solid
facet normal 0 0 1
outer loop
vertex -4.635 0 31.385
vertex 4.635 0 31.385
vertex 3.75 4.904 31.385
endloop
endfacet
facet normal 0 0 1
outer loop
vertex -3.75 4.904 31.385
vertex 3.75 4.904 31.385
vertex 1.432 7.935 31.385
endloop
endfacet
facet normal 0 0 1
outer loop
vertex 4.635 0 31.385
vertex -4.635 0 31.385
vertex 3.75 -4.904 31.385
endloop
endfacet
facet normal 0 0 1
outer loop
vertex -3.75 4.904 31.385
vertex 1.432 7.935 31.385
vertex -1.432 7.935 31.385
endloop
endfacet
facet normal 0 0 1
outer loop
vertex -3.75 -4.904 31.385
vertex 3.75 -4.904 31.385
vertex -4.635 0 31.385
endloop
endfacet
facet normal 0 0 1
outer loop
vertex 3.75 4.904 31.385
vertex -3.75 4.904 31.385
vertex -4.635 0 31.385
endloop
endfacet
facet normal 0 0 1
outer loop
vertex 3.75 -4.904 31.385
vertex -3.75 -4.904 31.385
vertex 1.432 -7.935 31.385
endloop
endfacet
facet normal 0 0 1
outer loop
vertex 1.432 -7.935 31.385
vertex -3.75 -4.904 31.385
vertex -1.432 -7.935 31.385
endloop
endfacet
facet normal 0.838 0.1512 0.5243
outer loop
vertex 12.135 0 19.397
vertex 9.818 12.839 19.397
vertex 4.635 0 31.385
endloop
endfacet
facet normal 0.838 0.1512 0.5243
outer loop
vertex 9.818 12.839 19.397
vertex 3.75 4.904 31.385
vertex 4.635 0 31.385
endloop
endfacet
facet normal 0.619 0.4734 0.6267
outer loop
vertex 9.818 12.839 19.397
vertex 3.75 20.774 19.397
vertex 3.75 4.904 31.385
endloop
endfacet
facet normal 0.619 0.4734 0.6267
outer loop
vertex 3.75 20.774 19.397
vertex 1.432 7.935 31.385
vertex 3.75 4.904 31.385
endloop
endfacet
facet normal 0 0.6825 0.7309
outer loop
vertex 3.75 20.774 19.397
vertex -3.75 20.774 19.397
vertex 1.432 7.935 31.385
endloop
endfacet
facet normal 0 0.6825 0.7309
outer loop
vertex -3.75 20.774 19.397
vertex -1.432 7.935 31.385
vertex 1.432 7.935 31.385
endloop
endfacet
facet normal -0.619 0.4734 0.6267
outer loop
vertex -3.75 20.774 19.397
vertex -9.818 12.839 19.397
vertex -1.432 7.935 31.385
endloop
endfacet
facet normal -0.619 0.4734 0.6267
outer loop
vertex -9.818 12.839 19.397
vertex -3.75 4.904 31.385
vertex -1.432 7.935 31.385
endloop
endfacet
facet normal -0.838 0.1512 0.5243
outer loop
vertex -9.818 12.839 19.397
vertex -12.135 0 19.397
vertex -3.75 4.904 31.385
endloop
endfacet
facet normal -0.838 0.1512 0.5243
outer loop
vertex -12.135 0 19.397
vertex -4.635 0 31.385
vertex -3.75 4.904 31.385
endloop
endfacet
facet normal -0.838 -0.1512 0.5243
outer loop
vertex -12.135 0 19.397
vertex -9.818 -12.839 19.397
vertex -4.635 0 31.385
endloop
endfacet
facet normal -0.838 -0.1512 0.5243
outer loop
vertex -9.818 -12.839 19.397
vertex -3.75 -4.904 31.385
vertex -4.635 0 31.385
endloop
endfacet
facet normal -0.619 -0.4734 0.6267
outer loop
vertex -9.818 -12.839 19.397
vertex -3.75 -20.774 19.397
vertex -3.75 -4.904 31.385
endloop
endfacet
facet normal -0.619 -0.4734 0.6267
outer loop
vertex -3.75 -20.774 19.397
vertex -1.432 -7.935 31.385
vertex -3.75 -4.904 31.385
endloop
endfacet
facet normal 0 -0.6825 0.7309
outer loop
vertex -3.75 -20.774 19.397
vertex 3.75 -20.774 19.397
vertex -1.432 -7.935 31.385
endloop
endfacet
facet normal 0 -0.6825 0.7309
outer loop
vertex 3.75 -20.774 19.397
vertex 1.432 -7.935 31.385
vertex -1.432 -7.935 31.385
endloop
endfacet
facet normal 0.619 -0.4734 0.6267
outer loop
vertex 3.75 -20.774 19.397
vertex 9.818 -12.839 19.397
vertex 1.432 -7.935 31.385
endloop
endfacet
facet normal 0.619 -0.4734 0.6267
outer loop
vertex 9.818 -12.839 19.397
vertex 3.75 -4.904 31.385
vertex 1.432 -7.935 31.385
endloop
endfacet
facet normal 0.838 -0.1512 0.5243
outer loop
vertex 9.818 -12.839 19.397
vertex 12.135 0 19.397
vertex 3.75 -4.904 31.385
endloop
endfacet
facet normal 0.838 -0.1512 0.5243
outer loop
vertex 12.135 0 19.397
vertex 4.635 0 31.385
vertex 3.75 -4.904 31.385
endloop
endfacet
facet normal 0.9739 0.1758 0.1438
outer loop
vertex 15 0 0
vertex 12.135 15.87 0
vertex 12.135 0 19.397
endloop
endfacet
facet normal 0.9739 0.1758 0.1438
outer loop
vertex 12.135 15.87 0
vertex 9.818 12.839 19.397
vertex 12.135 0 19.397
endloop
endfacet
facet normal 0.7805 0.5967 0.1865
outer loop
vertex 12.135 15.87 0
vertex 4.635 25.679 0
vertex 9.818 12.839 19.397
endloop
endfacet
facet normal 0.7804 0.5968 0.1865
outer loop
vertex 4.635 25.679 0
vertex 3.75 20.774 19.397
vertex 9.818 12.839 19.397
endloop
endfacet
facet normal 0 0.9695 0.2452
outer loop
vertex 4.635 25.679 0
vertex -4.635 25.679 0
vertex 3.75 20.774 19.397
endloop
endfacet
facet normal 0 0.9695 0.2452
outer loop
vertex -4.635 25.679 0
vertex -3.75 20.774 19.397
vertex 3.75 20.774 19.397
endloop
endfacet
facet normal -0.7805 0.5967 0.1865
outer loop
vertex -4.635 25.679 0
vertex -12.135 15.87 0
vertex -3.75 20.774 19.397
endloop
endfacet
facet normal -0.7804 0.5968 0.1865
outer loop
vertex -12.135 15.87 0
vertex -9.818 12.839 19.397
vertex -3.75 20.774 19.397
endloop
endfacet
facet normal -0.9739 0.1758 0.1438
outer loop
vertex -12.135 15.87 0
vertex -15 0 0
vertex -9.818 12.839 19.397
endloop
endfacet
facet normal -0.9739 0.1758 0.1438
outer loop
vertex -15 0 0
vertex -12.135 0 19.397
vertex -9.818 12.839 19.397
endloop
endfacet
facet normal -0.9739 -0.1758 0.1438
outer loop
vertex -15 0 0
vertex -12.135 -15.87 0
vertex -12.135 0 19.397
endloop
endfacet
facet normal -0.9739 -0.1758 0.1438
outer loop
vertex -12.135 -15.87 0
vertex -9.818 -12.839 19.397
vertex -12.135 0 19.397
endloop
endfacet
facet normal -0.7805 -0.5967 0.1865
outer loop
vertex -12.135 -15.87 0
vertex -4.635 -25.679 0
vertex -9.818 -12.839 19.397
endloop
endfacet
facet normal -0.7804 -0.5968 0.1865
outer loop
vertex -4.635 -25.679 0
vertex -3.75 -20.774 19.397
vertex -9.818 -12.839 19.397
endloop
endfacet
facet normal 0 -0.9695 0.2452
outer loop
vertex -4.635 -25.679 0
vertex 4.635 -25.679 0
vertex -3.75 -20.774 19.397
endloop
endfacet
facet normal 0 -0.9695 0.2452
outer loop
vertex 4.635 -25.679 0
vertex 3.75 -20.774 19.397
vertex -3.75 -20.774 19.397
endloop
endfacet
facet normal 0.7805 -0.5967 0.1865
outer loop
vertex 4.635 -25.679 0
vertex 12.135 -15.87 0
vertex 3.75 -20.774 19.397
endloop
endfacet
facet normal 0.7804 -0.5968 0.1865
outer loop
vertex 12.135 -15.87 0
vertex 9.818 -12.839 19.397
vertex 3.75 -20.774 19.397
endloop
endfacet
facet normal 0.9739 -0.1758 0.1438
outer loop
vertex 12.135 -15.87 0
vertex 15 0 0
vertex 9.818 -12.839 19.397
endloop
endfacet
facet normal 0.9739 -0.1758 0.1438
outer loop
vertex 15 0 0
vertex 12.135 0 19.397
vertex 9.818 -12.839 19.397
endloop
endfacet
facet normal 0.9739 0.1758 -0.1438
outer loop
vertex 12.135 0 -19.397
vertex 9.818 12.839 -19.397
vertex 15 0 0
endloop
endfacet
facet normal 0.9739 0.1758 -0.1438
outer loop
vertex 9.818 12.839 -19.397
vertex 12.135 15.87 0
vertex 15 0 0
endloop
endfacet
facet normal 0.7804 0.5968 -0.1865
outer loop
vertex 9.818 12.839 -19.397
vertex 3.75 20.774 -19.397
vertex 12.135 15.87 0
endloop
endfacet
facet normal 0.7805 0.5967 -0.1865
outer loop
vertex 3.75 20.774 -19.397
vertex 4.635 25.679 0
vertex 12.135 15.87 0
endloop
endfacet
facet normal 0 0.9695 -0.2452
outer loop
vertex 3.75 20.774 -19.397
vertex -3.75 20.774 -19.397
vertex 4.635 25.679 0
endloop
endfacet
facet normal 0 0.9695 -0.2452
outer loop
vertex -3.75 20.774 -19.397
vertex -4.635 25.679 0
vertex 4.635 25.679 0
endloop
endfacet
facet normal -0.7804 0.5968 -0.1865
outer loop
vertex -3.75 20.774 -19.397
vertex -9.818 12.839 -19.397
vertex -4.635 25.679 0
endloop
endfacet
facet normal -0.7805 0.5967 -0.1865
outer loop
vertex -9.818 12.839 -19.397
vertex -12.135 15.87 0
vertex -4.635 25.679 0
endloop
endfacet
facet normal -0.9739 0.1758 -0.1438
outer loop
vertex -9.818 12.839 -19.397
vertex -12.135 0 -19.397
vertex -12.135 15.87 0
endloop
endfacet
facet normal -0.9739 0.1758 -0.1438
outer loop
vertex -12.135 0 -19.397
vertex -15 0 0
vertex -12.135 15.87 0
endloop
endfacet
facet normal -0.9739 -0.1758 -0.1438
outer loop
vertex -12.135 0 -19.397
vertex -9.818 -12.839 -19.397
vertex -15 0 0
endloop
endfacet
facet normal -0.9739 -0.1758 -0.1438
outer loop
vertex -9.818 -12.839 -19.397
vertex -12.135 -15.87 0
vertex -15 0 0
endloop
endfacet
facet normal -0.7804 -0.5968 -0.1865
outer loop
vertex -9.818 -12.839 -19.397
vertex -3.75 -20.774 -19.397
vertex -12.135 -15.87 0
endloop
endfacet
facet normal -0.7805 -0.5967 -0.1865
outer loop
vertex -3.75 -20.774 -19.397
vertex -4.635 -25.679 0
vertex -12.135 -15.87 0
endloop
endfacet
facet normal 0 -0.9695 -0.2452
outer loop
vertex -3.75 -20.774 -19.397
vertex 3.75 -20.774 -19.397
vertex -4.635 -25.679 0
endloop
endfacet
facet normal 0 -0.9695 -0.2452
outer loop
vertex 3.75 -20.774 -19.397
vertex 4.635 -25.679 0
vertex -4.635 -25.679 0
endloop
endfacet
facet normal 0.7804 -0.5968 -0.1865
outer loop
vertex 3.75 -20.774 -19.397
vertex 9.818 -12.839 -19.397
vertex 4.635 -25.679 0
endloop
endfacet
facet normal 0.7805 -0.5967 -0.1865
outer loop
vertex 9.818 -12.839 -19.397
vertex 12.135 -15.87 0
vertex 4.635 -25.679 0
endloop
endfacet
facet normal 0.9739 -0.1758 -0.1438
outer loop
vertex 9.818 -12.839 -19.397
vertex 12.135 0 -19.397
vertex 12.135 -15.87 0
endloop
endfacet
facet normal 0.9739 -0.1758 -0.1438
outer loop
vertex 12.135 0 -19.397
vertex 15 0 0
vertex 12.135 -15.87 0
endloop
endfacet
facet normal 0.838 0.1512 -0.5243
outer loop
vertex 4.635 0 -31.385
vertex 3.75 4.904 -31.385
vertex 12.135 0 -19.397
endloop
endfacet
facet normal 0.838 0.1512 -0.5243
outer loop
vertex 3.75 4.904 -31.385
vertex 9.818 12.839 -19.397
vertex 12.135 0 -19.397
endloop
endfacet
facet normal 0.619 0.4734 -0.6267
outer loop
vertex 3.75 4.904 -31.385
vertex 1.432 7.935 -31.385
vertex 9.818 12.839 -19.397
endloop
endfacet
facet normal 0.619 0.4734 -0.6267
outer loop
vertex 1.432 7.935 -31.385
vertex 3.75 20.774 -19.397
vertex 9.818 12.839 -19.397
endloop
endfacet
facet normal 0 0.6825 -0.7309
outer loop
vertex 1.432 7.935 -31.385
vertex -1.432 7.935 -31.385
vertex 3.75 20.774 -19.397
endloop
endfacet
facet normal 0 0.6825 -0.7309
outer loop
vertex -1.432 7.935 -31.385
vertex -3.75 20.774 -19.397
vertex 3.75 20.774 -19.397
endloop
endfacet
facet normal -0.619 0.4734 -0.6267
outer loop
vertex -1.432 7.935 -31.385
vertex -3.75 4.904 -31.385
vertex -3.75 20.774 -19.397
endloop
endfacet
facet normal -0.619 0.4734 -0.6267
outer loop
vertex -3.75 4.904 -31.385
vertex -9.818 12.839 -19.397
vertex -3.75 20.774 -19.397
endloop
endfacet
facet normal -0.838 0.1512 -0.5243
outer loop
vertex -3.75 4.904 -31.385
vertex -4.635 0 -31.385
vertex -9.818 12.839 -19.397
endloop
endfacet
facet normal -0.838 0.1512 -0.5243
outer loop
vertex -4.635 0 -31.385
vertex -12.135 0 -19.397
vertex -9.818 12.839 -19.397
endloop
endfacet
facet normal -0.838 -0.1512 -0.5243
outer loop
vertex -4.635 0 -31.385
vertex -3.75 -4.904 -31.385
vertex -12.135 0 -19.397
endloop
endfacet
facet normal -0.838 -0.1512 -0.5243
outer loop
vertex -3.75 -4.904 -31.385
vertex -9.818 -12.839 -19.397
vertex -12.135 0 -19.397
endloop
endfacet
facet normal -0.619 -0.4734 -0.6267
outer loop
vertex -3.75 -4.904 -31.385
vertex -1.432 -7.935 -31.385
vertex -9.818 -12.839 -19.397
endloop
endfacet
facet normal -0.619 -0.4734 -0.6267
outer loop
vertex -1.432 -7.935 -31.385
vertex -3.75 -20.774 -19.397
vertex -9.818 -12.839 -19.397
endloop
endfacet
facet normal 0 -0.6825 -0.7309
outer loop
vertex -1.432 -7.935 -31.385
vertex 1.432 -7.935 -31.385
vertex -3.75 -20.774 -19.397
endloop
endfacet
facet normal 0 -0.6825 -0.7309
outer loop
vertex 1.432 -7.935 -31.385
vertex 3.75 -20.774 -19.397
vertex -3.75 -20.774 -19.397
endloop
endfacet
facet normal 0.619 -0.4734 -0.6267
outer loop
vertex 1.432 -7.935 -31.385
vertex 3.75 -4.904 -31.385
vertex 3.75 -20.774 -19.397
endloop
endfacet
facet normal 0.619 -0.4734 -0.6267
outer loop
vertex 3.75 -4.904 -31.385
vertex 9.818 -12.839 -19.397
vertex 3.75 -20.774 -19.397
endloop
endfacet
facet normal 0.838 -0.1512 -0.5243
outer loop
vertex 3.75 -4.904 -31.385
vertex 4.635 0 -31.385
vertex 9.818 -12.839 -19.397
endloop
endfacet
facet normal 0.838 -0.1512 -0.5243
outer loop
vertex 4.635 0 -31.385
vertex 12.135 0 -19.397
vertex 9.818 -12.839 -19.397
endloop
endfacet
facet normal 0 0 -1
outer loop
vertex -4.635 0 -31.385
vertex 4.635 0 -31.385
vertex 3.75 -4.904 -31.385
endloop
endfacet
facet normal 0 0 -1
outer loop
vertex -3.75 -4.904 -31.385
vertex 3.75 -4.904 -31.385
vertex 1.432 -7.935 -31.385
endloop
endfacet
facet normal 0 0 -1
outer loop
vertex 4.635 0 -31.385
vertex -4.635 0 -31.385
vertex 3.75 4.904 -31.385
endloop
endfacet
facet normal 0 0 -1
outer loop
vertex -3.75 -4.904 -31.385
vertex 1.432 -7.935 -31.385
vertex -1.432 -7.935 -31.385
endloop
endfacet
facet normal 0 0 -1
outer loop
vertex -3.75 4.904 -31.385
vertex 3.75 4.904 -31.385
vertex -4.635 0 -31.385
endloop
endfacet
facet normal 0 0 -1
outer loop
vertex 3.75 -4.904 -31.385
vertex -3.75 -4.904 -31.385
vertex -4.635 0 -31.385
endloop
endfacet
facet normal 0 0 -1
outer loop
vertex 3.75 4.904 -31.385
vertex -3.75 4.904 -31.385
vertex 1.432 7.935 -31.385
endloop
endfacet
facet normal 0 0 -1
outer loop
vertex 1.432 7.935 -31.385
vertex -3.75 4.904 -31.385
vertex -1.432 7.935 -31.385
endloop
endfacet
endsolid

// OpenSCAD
// Generated by SolidPython 1.0.1 on 2020-07-29 00:46:46


scale(v = [5, 9, 11]) {
	sphere(r = 3);
}
/***********************************************
*********      SolidPython code:      **********
************************************************
 
# import packages: SolidPython
from solid import *
from solid.utils import *
from itertools import chain, combinations, permutations


class Resize:

    def __init__(self, scad_file):
        self.scad_file = scad_file
        #self.scad_file = import_scad(scad_file)
        # cone/cylinder param:
        self.r1 = 0
        self.r2 = 0
        self.h = 0
        # rectangular prism param:
        self.w = 0
        self.l = 0
        # ellipse param:
        self.r = 0

    # import OpenScad code (file name corresponds to shape)


    # classify shape + parameters
    def assign(self, param1, param2, param3):
        if self.scad_file == 'cone.scad':
            self.r1 = param1
            self.r2 = param2
            self.h = param3
        elif self.scad_file == 'cylinder.scad':
            self.r1 = param1
            self.r2 = param2
            self.h = param3
        elif self.scad_file == 'rectangularPrism.scad':
            self.h = param1
            self.l = param2
            self.w = param3
        else:
            self.r = param1
            self.h = param2

    # resize parameters
    def iterate(self):
        x = range(3, 20, 2)
        i = 1
        if self.scad_file == 'cone.scad':
            tempList = list(permutations(x, 2))
            for temp in tempList:
                param1 = temp[0]
                param2 = temp[1]
                filepath = 'produced_scad_files/' + 'cone' + str(param1) + '_' + str(param2) + '_' + '.scad'
                scad_render_to_file(cylinder(h=param1, r1=param2, r2=0), filepath)

        elif self.scad_file == 'cylinder.scad':
            tempList = list(permutations(x, 3))
            for temp in tempList:
                param1 = temp[0]
                param2 = temp[1]
                filepath = 'produced_scad_files/' + 'cylinder' + str(param1) + '_' + str(param2) + '_' + '.scad'
                scad_render_to_file(cylinder(h=param1, r1=param2, r2=param2), filepath)

        elif self.scad_file == 'rectangularPrism.scad':
            tempList = list(permutations(x, 3))
            for temp in tempList:
                param1 = temp[0]
                param2 = temp[1]
                param3 = temp[2]
                filepath = 'produced_scad_files/' + 'rectangularPrism' + str(param1) + '_' + str(param2) + '_' + str(
                    param3) + '.scad'
                scad_render_to_file(cube(size=(param1, param2, param3)), filepath)

        elif self.scad_file == 'ellipse.scad':
            tempList = list(permutations(x, 4))
            for temp in tempList:
                param1 = temp[0]
                param2 = temp[1]
                param3 = temp[2]
                param4 = temp[3]
                filepath = 'produced_scad_files/' + 'ellipse' + str(param1) + '_' + str(param2) + '_' + str(param3) + '_' + str(param4) + '.scad'
                scad_render_to_file(scale([param1, param2, param3])(sphere(r=param4)), filepath)

    def render_to_scadfile(self):
        scad_render_to_file(scad, 'example.scad') 
 
************************************************/
